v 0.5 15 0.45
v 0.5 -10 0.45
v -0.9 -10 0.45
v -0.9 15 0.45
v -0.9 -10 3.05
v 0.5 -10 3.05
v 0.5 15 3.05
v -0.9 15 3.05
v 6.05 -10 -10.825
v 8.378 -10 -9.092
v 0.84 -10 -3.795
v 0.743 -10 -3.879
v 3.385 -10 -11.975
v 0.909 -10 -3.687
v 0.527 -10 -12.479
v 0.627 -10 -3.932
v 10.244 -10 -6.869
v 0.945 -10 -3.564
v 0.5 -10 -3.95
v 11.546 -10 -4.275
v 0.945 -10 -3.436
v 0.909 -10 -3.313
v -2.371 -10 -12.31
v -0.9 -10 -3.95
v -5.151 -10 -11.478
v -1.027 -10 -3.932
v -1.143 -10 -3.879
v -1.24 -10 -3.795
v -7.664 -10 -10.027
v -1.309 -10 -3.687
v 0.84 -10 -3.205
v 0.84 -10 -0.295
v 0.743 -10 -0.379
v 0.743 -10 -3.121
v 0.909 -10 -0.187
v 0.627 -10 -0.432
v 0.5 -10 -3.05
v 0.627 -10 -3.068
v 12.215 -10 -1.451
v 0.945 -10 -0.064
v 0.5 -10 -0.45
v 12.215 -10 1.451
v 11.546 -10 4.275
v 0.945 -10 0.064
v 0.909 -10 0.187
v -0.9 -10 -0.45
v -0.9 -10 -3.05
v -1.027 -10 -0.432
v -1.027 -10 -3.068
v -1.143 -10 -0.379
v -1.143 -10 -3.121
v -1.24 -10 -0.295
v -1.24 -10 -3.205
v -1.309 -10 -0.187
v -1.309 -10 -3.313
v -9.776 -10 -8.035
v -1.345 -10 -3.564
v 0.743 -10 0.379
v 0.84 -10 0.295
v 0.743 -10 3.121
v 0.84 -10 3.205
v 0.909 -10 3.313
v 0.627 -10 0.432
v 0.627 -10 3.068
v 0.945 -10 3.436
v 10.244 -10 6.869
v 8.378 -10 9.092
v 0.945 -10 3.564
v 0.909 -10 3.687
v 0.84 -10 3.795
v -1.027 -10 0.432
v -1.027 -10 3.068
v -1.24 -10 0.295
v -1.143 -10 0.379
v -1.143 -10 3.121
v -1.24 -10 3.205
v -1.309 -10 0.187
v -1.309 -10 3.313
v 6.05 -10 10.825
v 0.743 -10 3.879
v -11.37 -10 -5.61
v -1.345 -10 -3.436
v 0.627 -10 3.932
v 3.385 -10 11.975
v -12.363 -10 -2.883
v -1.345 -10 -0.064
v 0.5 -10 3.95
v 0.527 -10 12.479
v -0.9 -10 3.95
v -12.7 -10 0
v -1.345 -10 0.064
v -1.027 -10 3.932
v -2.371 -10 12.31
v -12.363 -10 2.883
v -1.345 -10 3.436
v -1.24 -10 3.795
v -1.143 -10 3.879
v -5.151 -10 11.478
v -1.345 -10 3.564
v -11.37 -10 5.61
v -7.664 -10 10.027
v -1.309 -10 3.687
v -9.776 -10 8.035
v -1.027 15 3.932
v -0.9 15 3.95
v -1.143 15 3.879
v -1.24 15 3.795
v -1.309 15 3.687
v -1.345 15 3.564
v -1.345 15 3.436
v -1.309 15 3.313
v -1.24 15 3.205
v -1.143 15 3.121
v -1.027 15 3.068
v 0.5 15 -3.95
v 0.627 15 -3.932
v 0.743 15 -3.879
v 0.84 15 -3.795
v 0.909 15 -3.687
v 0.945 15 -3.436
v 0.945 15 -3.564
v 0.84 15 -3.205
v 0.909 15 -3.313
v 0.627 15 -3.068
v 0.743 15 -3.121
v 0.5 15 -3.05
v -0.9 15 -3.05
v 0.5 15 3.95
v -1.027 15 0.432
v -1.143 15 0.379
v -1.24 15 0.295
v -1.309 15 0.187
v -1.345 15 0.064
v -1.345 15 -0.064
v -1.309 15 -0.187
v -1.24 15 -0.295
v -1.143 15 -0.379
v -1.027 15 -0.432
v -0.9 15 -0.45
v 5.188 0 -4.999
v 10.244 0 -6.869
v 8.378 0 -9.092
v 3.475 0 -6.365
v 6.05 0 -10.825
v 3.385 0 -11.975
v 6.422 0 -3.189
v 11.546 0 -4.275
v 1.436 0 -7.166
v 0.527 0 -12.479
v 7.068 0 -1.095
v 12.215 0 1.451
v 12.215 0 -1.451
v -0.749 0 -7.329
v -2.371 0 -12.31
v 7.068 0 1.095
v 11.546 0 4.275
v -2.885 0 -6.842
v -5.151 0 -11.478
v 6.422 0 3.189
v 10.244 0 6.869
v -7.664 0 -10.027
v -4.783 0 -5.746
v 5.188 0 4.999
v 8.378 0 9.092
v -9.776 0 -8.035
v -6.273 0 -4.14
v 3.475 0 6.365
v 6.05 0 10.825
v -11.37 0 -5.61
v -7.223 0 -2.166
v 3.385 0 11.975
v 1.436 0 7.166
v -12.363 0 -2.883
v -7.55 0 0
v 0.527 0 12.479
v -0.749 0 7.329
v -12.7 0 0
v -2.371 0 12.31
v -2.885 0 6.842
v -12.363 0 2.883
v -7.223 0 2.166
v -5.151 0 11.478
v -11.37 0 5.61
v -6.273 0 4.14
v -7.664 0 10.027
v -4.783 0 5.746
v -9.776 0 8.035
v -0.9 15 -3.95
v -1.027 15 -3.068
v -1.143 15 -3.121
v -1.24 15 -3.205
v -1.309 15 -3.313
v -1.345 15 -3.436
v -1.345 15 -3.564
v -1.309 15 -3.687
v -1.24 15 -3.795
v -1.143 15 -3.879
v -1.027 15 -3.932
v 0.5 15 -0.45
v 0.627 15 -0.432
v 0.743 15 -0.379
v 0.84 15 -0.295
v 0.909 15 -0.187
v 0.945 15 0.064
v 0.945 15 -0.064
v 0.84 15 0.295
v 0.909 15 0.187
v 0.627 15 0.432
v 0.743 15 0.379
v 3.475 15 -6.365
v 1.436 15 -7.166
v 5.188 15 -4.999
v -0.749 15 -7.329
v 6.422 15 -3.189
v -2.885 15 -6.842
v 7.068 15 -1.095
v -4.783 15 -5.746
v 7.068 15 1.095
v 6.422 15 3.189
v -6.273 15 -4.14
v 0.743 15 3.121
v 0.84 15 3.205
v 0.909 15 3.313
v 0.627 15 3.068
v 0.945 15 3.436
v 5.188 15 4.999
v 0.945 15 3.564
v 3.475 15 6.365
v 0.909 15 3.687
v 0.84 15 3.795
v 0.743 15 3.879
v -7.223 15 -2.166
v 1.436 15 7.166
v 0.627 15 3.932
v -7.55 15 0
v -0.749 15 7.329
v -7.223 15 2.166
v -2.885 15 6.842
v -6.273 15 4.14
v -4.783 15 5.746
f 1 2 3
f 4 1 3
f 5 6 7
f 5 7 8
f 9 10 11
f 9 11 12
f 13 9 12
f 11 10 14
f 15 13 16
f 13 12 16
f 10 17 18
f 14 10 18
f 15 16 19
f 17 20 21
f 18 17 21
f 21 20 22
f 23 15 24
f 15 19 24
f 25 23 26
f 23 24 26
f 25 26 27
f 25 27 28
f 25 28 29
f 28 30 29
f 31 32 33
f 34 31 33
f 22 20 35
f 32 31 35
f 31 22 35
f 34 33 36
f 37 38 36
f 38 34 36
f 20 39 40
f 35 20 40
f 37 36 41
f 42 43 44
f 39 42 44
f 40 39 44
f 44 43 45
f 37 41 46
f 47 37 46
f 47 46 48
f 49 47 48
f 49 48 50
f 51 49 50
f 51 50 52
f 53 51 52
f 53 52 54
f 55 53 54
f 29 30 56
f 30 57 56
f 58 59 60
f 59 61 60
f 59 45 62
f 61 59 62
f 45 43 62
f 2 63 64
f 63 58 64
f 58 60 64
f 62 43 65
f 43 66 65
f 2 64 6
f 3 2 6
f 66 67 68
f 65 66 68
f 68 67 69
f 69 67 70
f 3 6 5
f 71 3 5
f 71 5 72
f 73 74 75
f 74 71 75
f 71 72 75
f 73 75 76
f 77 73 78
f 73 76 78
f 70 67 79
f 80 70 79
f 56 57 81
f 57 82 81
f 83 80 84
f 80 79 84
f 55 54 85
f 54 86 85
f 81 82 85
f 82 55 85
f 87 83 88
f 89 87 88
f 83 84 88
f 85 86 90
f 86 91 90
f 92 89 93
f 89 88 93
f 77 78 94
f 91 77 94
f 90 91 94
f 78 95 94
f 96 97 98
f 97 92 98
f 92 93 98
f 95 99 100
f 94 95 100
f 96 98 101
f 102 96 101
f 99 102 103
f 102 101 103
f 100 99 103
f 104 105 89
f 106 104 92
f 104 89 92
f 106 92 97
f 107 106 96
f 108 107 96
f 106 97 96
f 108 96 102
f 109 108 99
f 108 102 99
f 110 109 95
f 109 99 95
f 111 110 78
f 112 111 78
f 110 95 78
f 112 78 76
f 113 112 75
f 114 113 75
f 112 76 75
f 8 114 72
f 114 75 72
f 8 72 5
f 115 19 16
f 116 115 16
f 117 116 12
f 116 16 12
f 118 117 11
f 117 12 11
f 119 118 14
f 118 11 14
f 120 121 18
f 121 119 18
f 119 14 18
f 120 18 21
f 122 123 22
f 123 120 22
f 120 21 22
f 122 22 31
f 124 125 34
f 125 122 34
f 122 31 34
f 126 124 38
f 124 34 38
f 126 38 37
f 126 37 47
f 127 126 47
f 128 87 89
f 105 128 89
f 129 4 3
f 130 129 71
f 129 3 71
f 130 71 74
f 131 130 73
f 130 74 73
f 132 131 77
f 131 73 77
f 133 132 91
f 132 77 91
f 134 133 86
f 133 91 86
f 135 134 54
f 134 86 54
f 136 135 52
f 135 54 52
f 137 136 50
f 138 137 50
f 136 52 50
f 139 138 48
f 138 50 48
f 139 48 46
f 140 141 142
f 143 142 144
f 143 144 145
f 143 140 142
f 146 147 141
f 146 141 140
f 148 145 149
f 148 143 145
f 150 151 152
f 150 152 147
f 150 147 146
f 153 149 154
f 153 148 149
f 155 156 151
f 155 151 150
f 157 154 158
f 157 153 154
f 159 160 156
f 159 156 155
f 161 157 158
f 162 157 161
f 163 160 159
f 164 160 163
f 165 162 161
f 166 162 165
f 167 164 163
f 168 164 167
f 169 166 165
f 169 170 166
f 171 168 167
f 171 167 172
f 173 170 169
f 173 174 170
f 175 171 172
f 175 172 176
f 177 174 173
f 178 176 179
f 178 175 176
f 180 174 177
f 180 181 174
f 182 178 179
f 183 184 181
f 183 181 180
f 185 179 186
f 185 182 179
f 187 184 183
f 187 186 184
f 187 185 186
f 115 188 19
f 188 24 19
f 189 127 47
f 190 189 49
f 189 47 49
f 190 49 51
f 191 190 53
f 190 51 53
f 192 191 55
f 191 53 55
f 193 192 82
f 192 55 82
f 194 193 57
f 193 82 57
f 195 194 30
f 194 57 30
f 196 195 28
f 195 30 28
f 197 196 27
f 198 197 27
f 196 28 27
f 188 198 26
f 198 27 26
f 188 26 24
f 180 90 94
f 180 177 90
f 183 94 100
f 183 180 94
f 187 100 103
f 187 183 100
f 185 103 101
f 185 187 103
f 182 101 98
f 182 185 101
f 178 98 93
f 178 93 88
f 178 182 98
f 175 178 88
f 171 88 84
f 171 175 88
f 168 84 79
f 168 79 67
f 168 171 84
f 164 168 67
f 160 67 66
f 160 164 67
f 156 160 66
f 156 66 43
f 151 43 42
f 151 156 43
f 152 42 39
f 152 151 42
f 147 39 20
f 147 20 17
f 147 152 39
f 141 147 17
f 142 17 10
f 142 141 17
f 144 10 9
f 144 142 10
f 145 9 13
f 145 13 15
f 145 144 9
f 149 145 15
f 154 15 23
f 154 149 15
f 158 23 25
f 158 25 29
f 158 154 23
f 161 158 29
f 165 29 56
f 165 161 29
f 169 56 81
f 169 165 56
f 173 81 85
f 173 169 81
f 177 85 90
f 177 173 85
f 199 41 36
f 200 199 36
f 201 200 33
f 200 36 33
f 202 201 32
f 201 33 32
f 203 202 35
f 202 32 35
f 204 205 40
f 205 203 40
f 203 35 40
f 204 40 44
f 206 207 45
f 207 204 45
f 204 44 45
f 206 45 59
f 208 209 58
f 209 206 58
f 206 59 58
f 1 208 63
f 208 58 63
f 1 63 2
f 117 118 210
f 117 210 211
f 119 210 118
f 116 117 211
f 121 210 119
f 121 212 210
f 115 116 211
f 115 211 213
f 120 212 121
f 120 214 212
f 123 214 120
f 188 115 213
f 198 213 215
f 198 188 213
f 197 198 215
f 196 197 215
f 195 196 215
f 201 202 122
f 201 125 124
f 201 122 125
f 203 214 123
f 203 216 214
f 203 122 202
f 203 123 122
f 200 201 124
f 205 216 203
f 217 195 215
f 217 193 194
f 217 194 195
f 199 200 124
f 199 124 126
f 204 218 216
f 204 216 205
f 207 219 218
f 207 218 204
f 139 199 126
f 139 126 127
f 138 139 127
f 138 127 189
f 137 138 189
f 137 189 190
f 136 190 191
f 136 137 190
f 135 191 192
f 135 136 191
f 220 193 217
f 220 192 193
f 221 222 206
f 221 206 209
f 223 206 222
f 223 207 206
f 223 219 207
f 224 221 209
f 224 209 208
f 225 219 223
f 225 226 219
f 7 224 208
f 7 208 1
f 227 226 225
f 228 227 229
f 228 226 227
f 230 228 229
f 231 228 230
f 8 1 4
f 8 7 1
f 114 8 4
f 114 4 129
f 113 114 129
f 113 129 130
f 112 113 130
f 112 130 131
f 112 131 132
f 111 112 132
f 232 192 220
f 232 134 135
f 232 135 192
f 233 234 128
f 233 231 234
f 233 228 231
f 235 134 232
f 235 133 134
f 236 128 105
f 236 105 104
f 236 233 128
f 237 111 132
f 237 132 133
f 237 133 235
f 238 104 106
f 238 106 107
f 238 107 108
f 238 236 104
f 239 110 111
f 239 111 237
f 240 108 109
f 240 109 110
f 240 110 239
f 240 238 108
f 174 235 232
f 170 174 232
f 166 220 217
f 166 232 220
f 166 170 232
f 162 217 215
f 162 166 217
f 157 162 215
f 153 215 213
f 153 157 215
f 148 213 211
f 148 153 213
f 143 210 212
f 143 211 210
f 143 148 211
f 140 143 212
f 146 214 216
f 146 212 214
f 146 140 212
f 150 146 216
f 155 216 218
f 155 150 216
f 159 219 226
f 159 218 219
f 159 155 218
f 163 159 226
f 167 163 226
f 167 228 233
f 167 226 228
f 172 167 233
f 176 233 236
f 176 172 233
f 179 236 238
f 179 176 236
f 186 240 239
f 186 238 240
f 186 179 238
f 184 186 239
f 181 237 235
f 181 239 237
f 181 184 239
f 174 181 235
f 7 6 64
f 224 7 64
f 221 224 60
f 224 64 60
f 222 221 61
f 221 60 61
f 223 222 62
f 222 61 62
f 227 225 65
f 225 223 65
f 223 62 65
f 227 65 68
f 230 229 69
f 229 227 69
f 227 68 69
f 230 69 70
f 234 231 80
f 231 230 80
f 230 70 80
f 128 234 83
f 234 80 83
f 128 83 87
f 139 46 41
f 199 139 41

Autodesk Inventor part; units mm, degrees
ref_plane "YZ Plane" through (0, 0, 0) normal (1, 0, 0) x (0, 1, 0)
ref_plane "XZ Plane" through (0, 0, 0) normal (0, 1, 0) x (-1, 0, 0)
ref_plane "XY Plane" through (0, 0, 0) normal (0, 0, 1) x (1, 0, 0)
sketch "Sketch1" plane through (0, 0, 0) normal (0, 1, 0) x (-1, 0, 0)
  circle A0 centre (0.2, 0) radius 7.35
  circle A1 centre (0.2, 0) radius 12.5
  line L0 (0.2, 0) -> (0.2, -3.5)
  line L1 (0.2, 0) -> (0.2, 3.5)
  line L2 (0.2, 3.5) -> (-0.5, 3.5)
  line L3 (-0.5, 3.5) -> (0.9, 3.5)
  line L4 (0.2, 0) -> (-0.5, 0)
  line L5 (-0.5, 0) -> (0.9, 0)
  line L6 (0.2, -3.5) -> (-0.5, -3.5)
  line L7 (-0.5, -3.5) -> (0.9, -3.5)
  circle A2 centre (-0.5, -3.5) radius 0.45
  circle A3 centre (0.9, -3.5) radius 0.45
  circle A4 centre (-0.5, 0) radius 0.45
  circle A5 centre (0.9, 0) radius 0.45
  circle A6 centre (-0.5, 3.5) radius 0.45
  circle A7 centre (0.9, 3.5) radius 0.45
  line L8 (0.9, -3.95) -> (-0.5, -3.95)
  line L9 (-0.5, -3.05) -> (0.9, -3.05)
  line L10 (0.9, -0.45) -> (-0.5, -0.45)
  line L11 (-0.5, 0.45) -> (0.9, 0.45)
  line L12 (-0.5, 3.05) -> (0.9, 3.05)
  line L13 (-0.5, 3.95) -> (0.9, 3.95)
  line L14 (1.35, 3.5) -> (1.35, -3.5)
  dimension "d0" = 14.7
  dimension "d1" = 25
  dimension "d14" = 3.5
  dimension "d15" = 3.5
  dimension "d16" = 0.7
  dimension "d17" = 1.4
  dimension "d18" = 0.7
  dimension "d19" = 1.4
  dimension "d20" = 0.7
  dimension "d21" = 1.4
  dimension "d22" = 0.9
  dimension "d23" = 0.9
  dimension "d24" = 0.9
  dimension "d25" = 0.9
  dimension "d26" = 0.9
  dimension "d27" = 0.9
extrude "Extrusion1" add sketch "Sketch1" along normal blind 15 contours A0 | L10 A5 L14 A3 L9 L0 | L1 L12 A7 L14 A5 L11
extrude "Extrusion2" add sketch "Sketch1" against normal blind 10 contours A0 | A1 | L10 A5 L14 A3 L9 L0 | L1 L12 A7 L14 A5 L11
properties part number "Kabelstopfen_Hinten_next try"
